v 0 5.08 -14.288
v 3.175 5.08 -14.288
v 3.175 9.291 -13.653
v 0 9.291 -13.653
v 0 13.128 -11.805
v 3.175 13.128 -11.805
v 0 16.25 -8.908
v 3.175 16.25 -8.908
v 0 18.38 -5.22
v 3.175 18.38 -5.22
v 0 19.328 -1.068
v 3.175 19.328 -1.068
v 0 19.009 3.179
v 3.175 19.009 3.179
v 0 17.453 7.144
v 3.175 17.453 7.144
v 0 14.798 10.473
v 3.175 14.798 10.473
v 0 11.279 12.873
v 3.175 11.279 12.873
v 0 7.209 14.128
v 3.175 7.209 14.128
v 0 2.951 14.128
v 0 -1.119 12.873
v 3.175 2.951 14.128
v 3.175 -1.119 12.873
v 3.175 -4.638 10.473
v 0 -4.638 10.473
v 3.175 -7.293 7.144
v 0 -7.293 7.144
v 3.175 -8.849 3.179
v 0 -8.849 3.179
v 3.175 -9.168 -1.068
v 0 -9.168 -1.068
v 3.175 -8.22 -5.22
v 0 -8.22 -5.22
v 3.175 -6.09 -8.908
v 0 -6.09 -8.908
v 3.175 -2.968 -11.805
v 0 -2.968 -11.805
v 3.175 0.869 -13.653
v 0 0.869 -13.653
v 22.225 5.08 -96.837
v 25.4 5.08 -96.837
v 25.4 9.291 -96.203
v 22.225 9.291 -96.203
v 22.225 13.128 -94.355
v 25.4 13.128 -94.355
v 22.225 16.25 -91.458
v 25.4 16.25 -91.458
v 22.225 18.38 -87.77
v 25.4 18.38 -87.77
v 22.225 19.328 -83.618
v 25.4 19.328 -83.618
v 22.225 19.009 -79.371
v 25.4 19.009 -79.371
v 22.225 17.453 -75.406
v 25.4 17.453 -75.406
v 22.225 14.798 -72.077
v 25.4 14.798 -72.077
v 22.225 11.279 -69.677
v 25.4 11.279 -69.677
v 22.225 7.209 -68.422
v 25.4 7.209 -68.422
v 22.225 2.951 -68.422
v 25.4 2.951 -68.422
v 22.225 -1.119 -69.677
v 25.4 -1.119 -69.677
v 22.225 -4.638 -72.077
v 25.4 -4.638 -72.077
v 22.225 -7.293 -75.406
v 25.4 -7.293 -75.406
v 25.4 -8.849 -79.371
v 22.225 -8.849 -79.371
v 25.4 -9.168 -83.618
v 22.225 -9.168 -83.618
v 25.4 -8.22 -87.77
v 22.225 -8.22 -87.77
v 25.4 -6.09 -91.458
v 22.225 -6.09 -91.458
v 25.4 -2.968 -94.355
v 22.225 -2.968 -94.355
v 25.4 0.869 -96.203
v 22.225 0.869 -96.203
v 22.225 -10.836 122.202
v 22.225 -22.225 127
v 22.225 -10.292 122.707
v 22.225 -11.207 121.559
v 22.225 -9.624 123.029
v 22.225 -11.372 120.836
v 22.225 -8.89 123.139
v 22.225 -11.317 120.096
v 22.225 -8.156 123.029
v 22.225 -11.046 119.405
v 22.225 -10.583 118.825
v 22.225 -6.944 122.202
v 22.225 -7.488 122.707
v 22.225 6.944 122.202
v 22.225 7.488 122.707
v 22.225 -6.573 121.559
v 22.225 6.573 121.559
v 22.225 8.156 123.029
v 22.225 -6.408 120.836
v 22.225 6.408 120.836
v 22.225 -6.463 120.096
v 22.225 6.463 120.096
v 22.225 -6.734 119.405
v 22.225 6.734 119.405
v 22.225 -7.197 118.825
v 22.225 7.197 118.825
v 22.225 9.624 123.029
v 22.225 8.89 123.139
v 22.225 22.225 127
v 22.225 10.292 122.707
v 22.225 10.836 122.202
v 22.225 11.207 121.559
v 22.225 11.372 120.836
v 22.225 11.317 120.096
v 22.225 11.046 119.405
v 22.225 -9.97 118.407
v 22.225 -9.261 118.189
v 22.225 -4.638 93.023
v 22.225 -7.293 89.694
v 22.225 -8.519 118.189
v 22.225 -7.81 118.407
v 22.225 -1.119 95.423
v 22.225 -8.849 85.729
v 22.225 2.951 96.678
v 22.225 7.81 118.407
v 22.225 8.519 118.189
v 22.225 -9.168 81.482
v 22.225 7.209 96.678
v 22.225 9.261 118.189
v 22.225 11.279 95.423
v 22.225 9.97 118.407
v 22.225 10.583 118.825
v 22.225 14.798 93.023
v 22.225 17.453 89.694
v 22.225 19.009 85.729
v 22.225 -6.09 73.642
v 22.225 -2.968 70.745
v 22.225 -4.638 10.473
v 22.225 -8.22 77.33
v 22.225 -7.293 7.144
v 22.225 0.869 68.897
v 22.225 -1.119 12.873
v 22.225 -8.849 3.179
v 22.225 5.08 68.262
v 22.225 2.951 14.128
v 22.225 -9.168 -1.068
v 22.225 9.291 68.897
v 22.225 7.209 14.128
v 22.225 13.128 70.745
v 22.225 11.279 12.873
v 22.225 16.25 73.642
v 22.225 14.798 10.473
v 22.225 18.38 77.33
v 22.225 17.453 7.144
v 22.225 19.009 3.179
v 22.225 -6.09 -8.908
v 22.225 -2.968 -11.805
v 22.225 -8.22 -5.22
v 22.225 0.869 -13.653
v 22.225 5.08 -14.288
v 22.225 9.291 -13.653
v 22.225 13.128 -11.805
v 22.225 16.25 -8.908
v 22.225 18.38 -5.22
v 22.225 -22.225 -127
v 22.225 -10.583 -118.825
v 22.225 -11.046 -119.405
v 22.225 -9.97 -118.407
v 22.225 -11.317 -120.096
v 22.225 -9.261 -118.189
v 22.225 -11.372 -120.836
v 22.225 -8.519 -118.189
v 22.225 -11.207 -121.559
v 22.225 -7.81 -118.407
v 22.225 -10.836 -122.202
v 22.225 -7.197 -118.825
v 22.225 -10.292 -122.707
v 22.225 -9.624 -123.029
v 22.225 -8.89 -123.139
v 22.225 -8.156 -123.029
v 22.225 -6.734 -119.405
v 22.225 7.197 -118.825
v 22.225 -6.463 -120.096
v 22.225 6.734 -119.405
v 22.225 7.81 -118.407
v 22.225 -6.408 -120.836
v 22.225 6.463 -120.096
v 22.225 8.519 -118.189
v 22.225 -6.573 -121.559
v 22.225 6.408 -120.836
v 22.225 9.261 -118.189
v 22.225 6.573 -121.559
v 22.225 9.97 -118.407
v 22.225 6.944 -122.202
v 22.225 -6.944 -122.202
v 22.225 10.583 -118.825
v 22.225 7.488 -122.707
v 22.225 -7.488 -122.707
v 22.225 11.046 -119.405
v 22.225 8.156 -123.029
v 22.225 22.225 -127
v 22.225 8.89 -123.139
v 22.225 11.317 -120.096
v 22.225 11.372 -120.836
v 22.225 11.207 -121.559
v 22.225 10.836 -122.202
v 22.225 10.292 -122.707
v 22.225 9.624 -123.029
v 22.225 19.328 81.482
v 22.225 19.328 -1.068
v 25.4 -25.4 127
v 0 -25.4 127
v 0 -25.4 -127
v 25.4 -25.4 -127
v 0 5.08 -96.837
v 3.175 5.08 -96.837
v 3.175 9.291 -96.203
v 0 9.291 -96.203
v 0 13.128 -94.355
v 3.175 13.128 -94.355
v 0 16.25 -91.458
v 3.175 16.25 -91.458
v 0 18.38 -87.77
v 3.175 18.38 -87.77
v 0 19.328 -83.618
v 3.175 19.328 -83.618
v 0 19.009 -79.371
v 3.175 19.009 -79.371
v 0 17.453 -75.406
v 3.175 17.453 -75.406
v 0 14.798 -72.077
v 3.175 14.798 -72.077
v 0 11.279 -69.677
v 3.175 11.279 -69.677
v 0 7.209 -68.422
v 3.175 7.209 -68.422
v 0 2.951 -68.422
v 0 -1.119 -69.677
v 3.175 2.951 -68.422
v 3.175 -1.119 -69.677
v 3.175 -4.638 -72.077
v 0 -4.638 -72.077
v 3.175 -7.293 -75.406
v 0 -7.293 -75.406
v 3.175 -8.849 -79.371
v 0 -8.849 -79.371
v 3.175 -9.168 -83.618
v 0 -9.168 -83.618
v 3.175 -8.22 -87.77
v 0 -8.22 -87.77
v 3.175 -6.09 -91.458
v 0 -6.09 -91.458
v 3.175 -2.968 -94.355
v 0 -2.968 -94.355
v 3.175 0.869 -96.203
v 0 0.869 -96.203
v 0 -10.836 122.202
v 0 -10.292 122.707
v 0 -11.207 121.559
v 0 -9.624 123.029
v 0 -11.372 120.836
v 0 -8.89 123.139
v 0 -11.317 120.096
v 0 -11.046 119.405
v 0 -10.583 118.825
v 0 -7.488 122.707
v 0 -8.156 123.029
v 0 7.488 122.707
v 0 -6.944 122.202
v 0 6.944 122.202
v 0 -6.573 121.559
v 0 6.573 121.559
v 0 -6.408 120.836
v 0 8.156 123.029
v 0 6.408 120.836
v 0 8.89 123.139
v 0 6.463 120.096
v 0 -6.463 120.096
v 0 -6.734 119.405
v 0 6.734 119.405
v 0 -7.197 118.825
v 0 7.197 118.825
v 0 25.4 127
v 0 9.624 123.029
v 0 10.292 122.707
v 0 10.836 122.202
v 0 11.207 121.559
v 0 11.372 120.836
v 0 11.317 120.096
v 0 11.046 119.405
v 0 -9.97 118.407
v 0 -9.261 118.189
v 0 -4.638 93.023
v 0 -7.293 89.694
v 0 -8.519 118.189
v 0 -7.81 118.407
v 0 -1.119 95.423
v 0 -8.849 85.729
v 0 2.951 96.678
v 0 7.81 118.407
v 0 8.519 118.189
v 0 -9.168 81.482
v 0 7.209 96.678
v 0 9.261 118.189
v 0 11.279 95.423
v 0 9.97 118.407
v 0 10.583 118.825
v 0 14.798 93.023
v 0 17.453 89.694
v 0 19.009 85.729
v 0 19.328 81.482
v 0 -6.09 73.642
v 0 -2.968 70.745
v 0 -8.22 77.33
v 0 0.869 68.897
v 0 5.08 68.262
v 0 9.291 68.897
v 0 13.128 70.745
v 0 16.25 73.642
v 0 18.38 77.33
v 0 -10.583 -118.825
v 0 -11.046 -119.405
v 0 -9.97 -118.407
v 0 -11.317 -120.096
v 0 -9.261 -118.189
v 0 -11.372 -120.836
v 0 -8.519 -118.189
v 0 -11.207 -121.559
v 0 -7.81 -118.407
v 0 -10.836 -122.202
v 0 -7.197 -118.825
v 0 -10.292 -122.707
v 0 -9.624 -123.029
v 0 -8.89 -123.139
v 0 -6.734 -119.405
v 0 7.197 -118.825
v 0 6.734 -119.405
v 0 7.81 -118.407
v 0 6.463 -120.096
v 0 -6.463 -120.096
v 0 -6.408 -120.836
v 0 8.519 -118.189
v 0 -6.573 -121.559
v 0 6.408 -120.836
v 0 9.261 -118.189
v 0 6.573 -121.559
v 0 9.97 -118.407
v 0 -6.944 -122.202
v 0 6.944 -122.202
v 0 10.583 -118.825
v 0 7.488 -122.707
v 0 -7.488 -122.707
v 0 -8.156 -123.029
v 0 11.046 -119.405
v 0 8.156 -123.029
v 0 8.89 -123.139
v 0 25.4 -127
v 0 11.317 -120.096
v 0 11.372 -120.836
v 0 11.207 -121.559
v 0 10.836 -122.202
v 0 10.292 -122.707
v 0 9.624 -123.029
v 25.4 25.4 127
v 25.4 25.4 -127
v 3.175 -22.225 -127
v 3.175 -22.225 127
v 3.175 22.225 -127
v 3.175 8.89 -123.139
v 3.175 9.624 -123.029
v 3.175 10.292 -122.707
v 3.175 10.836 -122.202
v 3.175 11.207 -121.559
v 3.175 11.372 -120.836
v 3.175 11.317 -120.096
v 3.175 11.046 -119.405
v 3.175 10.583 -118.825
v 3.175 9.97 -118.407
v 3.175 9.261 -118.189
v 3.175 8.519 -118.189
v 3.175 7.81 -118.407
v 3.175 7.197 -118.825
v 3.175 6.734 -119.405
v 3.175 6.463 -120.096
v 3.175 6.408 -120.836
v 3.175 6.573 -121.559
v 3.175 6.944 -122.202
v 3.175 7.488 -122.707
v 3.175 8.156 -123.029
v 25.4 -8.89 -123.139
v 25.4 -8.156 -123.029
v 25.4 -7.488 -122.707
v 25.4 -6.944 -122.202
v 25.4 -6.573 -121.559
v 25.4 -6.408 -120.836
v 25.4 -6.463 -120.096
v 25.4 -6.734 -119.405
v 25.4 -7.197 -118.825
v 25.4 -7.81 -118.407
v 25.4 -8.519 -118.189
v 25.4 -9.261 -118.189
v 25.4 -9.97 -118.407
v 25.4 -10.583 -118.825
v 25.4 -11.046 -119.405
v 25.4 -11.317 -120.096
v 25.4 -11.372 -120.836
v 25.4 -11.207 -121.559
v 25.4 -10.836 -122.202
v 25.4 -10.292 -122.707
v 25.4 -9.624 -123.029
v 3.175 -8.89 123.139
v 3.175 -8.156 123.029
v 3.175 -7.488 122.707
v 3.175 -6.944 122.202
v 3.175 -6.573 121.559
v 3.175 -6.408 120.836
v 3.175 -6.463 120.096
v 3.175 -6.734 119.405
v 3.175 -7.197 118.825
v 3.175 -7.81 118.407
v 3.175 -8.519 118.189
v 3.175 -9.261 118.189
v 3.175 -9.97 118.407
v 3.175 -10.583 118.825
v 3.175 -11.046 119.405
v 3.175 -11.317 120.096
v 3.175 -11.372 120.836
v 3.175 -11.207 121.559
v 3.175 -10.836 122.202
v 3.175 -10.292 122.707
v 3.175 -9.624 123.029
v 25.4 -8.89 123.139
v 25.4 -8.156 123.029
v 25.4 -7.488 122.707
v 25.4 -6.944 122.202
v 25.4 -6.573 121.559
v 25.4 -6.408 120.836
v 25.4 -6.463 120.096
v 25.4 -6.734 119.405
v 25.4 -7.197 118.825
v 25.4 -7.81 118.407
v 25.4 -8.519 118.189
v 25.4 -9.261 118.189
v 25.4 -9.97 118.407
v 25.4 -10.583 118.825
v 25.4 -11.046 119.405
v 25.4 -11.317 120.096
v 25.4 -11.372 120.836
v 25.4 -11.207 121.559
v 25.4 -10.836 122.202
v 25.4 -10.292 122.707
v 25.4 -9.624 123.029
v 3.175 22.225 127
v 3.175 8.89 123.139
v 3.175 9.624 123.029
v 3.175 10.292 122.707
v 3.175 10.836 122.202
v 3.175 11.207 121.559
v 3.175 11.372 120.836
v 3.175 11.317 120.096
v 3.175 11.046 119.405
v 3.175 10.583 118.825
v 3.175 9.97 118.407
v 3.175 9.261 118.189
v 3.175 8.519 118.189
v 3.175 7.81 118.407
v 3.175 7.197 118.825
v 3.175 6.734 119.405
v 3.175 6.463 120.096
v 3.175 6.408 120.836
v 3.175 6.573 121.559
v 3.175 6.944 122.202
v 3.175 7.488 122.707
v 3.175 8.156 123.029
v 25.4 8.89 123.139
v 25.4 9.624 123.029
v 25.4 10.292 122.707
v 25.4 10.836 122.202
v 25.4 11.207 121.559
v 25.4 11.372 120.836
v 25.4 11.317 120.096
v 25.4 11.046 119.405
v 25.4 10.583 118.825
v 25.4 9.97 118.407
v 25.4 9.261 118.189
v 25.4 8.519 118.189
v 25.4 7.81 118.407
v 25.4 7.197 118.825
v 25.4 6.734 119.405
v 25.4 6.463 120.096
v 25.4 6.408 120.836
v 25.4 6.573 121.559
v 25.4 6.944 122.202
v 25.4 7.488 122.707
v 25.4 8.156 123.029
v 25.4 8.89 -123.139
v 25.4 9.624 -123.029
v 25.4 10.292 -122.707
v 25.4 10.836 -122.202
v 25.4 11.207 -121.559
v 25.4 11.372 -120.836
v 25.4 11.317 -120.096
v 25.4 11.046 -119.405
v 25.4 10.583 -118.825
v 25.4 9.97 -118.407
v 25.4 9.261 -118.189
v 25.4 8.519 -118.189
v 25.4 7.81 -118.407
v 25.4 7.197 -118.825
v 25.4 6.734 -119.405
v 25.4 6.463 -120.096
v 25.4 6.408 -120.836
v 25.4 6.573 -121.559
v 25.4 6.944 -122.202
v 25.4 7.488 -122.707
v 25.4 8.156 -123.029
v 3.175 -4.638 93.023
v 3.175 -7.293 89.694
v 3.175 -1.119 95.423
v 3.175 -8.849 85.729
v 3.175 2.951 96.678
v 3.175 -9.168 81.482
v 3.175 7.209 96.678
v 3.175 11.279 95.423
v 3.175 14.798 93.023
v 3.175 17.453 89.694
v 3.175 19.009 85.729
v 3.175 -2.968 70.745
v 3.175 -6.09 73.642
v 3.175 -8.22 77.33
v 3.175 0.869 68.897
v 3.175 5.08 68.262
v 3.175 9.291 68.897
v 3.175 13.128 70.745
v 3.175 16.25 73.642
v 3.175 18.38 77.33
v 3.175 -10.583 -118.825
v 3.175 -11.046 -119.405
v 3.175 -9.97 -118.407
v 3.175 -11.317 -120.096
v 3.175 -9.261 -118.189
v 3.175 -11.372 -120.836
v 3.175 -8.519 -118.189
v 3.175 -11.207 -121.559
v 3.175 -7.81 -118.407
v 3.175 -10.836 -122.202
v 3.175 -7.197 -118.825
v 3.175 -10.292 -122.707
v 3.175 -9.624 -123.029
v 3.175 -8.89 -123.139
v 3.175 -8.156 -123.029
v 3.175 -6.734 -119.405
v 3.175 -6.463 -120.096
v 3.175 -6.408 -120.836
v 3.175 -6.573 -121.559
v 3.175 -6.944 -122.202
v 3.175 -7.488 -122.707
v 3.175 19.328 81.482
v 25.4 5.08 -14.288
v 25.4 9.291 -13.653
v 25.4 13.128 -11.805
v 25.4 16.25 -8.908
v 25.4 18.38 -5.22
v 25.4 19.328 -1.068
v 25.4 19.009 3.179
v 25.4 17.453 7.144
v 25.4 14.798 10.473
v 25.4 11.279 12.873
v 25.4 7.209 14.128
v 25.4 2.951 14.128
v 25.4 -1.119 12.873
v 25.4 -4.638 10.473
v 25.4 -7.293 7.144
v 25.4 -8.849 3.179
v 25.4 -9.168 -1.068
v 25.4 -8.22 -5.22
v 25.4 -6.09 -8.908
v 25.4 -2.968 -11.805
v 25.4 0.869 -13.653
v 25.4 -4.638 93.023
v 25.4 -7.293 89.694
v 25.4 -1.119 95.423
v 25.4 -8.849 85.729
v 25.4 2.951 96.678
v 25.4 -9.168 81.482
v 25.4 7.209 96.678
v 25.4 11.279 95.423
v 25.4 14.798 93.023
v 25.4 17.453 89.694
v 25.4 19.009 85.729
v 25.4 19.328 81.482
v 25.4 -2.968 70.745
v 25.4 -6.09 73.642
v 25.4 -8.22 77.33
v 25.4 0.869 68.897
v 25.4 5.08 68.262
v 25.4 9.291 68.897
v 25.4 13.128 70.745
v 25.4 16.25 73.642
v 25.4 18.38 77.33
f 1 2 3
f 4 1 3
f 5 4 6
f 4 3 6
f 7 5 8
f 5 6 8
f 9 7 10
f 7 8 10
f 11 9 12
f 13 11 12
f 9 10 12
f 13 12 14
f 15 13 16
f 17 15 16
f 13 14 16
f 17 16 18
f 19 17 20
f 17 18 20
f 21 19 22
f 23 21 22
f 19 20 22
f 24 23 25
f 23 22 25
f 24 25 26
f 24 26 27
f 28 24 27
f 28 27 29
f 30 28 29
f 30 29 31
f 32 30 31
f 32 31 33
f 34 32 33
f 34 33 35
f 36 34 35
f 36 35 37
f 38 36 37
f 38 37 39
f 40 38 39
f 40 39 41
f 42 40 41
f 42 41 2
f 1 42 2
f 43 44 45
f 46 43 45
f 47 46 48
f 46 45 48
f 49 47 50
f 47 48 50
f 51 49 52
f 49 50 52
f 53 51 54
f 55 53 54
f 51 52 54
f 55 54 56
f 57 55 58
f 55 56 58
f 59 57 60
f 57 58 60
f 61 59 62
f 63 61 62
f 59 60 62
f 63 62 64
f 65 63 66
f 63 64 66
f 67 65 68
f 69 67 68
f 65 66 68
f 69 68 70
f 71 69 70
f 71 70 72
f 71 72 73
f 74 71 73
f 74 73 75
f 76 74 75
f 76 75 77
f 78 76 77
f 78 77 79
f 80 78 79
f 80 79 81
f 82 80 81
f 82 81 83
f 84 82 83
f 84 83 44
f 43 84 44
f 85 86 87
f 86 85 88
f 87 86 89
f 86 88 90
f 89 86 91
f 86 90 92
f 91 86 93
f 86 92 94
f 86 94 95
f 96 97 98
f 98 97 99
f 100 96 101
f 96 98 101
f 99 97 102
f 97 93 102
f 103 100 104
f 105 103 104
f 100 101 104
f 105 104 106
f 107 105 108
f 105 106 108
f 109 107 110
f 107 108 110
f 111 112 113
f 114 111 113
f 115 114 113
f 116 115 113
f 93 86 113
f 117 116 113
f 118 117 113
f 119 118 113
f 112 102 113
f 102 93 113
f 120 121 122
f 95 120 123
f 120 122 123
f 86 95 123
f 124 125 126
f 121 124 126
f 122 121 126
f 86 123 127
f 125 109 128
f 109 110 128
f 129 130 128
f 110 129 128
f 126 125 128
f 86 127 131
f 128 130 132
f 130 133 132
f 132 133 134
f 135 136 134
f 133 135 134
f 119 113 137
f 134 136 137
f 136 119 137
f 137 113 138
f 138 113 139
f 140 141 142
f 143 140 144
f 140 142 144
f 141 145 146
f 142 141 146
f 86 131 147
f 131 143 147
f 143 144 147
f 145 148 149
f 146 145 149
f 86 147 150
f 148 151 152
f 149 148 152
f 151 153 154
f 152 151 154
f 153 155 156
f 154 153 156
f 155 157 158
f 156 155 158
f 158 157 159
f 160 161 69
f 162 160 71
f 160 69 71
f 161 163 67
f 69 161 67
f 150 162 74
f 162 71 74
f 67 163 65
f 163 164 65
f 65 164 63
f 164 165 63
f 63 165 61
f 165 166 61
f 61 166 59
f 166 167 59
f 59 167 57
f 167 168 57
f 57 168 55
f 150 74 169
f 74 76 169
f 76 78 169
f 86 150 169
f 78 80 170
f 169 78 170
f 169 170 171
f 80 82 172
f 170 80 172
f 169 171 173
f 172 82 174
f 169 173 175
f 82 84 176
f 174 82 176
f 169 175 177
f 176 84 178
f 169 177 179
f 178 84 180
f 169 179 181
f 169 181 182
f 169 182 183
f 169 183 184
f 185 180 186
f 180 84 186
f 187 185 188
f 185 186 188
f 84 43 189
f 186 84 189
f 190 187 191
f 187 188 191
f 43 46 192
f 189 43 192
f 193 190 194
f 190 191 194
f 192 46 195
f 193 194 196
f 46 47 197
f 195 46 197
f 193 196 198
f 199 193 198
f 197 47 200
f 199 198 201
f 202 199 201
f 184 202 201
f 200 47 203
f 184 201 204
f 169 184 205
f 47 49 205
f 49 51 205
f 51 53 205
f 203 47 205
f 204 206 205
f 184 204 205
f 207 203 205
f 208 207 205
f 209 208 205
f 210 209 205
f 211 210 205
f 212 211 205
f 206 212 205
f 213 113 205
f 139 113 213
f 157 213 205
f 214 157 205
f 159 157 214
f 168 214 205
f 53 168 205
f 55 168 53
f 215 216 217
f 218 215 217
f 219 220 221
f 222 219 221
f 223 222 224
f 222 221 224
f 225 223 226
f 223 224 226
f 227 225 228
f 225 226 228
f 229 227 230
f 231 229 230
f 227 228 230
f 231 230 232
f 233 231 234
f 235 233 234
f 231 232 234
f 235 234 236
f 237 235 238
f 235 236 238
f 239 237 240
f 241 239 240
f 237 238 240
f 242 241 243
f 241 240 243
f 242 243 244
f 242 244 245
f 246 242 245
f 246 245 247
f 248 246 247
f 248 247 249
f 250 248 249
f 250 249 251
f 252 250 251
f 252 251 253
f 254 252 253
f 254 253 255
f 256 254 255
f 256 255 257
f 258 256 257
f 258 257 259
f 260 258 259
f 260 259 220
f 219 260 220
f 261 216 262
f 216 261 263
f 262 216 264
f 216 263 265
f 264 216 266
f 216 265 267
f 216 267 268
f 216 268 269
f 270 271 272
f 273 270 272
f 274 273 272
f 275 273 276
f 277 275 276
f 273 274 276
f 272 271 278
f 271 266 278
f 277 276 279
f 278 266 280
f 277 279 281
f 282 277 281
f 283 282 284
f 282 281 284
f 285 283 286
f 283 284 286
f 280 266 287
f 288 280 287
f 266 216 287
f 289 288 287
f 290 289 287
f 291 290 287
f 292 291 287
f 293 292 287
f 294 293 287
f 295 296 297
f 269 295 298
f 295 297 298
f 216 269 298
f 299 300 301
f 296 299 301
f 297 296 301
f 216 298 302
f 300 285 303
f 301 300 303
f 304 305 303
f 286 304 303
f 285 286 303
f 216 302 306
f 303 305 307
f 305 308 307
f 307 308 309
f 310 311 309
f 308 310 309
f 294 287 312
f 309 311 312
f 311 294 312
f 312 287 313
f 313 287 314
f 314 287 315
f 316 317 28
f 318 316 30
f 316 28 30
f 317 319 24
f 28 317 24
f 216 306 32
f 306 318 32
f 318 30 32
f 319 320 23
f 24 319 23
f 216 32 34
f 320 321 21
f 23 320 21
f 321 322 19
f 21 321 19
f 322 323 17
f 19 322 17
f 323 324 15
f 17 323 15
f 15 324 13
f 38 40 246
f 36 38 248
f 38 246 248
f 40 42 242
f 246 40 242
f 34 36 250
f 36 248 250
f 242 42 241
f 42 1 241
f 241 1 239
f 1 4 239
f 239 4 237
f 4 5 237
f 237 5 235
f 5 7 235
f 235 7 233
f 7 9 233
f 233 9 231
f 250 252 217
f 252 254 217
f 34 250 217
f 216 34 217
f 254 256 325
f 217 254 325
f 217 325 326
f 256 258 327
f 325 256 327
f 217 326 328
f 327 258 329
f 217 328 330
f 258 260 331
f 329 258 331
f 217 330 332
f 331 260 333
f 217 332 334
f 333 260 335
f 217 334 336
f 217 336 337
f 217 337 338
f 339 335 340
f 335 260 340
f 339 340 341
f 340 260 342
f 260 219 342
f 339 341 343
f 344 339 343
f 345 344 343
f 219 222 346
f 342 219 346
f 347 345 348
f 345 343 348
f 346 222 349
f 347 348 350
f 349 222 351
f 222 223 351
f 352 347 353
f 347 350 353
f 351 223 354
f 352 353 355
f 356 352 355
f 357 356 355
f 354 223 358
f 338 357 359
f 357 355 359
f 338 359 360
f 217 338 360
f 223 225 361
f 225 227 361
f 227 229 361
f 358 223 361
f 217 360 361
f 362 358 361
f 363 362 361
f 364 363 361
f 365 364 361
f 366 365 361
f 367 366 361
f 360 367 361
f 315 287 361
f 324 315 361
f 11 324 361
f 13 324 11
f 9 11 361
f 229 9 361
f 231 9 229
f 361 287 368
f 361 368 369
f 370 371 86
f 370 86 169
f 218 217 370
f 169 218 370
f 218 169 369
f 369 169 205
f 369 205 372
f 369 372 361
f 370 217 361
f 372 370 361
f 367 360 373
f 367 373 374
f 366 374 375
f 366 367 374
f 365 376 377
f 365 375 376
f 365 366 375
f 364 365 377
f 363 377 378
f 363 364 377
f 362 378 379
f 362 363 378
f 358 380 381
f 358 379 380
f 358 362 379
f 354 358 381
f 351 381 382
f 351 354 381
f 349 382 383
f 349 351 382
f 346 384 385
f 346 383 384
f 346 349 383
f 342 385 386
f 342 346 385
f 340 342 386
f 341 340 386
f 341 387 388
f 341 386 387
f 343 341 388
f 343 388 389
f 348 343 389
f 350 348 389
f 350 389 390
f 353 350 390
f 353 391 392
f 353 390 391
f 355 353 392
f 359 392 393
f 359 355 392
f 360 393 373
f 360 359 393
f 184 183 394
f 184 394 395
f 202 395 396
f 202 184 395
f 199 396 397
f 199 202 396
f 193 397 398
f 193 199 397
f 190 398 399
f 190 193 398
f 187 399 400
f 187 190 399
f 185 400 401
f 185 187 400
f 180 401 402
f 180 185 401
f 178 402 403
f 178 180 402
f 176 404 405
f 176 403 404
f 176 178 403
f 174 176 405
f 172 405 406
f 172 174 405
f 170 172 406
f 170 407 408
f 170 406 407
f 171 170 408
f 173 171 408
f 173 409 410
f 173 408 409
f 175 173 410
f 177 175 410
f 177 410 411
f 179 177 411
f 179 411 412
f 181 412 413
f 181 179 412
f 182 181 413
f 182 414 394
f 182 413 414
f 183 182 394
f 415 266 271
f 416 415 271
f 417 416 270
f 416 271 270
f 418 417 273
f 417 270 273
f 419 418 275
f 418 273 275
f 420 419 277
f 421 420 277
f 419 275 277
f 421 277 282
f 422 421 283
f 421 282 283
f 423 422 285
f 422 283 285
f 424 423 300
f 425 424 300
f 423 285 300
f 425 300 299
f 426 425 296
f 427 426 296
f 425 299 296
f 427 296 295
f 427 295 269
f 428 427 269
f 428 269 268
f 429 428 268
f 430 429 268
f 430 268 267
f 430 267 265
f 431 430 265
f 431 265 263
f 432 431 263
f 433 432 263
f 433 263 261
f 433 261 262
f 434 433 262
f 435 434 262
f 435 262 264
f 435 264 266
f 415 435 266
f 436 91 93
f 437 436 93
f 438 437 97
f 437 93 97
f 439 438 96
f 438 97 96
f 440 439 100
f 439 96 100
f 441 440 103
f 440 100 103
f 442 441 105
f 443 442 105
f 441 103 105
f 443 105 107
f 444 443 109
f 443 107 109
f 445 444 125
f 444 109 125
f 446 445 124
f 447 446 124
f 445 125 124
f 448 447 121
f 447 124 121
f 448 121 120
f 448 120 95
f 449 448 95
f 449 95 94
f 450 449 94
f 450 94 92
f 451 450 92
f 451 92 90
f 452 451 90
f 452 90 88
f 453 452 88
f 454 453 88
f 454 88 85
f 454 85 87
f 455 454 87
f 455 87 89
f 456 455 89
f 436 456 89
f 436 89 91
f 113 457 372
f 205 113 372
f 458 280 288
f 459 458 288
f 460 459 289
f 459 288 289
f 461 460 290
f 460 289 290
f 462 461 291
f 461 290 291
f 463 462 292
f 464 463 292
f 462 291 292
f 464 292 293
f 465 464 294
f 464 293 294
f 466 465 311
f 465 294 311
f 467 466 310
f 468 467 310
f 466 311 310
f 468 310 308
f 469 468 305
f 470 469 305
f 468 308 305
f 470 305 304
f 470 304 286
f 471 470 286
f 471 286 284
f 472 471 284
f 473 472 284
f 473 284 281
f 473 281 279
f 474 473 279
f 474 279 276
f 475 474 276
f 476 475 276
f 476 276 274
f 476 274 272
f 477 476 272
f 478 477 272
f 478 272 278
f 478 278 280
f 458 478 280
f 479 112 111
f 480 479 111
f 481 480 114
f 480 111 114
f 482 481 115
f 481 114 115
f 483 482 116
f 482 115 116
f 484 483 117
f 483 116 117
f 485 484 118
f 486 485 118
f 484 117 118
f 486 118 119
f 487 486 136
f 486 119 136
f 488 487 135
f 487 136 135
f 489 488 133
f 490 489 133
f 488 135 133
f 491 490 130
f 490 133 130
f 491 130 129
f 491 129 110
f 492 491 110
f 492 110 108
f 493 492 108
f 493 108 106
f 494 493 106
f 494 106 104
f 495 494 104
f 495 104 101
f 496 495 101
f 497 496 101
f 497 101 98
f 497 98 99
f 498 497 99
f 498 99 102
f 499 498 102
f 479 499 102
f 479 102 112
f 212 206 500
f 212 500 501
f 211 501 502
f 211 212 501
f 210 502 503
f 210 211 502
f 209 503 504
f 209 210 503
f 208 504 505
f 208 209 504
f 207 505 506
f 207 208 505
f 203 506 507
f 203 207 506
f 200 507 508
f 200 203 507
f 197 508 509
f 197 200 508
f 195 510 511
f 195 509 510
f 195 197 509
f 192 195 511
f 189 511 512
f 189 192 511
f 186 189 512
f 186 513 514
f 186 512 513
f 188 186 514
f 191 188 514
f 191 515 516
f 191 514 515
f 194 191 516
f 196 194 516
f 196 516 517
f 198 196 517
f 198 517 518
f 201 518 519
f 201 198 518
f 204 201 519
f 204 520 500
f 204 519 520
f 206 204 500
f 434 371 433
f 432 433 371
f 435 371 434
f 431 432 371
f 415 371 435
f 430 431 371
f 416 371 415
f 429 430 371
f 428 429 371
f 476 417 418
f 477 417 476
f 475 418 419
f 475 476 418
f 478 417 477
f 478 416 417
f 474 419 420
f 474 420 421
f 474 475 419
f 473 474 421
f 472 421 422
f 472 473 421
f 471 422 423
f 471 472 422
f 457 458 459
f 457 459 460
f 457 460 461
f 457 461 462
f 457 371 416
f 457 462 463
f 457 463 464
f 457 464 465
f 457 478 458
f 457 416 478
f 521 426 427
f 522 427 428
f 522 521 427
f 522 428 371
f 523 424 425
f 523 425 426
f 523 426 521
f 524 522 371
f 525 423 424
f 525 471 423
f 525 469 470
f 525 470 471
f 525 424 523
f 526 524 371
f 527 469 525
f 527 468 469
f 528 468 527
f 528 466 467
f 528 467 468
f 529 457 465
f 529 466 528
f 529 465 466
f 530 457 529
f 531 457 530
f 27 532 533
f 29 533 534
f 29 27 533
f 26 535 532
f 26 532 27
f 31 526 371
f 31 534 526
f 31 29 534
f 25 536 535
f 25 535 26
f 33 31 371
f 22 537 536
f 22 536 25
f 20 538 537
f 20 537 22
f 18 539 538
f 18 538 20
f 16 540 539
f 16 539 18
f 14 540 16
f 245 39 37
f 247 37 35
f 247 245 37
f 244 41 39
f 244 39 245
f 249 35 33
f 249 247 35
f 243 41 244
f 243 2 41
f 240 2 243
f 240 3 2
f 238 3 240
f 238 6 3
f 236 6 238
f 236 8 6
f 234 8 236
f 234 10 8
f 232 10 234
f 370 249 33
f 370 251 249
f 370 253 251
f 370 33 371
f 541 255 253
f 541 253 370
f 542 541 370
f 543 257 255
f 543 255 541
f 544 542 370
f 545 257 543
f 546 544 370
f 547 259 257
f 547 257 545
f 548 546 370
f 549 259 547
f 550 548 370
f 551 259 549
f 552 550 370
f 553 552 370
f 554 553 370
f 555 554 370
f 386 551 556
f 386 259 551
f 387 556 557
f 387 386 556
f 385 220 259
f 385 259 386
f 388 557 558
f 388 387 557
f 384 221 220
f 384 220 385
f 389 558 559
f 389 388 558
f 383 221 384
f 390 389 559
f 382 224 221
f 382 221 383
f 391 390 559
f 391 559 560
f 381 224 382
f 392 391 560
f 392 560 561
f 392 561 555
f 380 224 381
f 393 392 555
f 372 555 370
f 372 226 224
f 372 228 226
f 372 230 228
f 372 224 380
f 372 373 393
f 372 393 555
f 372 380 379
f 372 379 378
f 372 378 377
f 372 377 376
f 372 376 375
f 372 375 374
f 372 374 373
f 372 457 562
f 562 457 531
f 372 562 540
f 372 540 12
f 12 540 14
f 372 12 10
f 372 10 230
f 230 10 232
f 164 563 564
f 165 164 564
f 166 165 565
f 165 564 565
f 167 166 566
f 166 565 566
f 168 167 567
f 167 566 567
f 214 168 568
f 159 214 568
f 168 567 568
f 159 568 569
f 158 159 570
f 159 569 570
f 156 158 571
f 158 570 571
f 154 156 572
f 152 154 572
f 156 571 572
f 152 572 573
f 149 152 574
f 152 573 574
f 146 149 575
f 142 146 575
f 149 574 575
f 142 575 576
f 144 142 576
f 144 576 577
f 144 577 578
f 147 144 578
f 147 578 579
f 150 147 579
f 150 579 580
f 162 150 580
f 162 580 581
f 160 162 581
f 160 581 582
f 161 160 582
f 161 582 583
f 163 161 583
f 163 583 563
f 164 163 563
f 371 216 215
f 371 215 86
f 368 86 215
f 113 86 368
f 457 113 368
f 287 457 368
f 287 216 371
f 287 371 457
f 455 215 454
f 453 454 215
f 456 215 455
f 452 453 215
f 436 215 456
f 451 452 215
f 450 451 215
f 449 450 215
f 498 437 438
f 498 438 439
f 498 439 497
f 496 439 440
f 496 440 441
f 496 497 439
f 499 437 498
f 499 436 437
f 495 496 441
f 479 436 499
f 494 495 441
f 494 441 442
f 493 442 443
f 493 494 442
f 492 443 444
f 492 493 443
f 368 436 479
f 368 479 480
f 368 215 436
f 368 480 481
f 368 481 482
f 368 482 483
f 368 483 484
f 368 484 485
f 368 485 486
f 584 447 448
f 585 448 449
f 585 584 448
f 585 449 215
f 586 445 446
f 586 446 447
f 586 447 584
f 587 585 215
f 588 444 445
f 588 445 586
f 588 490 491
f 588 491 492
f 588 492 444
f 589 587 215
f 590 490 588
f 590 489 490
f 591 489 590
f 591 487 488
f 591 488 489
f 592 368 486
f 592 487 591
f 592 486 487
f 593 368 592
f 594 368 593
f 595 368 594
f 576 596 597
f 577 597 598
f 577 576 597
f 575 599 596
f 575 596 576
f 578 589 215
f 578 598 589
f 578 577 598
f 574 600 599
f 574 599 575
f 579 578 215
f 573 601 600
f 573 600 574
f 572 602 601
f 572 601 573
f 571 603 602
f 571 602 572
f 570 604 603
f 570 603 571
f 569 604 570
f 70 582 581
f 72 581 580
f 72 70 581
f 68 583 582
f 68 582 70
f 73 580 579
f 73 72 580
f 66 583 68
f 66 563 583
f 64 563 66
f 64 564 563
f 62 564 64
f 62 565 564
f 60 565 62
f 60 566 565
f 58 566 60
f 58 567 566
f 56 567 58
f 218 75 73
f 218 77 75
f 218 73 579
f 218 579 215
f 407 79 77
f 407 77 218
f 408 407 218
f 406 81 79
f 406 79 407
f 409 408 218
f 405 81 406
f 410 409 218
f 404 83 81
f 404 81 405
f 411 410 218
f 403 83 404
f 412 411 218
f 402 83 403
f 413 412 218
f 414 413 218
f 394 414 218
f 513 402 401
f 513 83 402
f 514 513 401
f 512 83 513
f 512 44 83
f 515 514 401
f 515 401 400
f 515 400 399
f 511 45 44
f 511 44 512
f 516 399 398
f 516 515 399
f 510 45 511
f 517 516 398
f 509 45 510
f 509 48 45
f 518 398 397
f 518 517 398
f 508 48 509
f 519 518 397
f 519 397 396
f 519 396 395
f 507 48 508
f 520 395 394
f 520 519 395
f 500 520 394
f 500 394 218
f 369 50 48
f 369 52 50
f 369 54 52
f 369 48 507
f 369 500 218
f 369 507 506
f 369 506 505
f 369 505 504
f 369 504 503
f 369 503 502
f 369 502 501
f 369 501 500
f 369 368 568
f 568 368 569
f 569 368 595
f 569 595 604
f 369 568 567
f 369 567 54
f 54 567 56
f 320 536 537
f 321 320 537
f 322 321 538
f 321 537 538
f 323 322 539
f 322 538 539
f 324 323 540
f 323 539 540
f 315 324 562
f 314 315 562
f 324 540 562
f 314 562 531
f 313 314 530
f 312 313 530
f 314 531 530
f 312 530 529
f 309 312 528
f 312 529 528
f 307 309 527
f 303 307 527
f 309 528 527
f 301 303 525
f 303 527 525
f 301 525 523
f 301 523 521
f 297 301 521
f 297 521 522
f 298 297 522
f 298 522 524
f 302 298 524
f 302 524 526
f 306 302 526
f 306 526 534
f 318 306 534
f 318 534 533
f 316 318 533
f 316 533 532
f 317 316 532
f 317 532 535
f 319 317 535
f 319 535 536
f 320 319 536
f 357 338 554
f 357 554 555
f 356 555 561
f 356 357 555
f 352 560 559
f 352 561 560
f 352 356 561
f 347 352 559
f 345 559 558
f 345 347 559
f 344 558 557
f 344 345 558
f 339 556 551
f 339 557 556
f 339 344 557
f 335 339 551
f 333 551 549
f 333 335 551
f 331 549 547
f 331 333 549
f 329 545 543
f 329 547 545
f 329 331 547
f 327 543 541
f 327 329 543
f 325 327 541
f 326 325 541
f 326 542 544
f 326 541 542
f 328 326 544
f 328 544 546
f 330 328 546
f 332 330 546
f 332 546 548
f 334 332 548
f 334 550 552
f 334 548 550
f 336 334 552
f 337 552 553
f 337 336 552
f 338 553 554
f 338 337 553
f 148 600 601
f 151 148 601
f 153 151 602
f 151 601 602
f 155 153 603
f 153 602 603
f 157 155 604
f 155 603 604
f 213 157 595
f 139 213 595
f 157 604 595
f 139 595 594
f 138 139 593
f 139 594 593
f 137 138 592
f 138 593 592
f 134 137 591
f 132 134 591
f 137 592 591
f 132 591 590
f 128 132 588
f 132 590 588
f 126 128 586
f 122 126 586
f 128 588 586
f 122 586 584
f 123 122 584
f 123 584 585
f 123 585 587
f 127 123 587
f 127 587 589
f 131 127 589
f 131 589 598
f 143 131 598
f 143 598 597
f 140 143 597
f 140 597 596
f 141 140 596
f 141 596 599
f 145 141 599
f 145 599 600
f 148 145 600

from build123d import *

# Parameters (mm, degrees)
SKETCH1_W              = 254
SKETCH1_H              = 50.8
BOSS_EXTRUDE1_DEPTH    = 25.4
SHELL1_T               = -3.175
SKETCH2_R              = 14.2875
CUT_EXTRUDE1_DEPTH     = 132.982271537
F_10_CLEARANCE_HOLE1_D = 4.9784


with BuildPart() as part:
    # Sketch1 → Boss-Extrude1 (new body)
    with BuildSketch(Plane(origin=(0, 0, 0), x_dir=(0, 0, -1), z_dir=(1, 0, 0))):
        Rectangle(SKETCH1_W, SKETCH1_H)
    extrude(amount=BOSS_EXTRUDE1_DEPTH)

    # Shell1
    shell1_openings = [part.faces().sort_by_distance(p)[0] for p in [
        (12.7, 0, 127),
        (12.7, 0, -127),
    ]]
    offset(amount=SHELL1_T, openings=shell1_openings, kind=Kind.INTERSECTION)

    # Sketch2 → Cut-Extrude1 (cut, through all)
    with BuildSketch(Plane(origin=(25.4, 0, 0), x_dir=(0, 0, -1), z_dir=(1, 0, 0))):
        with Locations((0, 5.08)):
            Circle(SKETCH2_R)
        with Locations((-82.55, 5.08)):
            Circle(SKETCH2_R)
        with Locations((82.55, 5.08)):
            Circle(SKETCH2_R)
    extrude(amount=-CUT_EXTRUDE1_DEPTH, mode=Mode.SUBTRACT)

    # #10 Clearance Hole1 (through all)
    with Locations(Plane(origin=(25.4, 0, 0), x_dir=(0, 0, -1), z_dir=(1, 0, 0))):
        with Locations((-120.65, 8.89), (-120.65, -8.89)):
            f_10_clearance_hole1 = Hole(F_10_CLEARANCE_HOLE1_D / 2)

    # Mirror1: #10 Clearance Hole1 across plane
    add(f_10_clearance_hole1.mirror(Plane.XY), mode=Mode.SUBTRACT)


solid = part.part
